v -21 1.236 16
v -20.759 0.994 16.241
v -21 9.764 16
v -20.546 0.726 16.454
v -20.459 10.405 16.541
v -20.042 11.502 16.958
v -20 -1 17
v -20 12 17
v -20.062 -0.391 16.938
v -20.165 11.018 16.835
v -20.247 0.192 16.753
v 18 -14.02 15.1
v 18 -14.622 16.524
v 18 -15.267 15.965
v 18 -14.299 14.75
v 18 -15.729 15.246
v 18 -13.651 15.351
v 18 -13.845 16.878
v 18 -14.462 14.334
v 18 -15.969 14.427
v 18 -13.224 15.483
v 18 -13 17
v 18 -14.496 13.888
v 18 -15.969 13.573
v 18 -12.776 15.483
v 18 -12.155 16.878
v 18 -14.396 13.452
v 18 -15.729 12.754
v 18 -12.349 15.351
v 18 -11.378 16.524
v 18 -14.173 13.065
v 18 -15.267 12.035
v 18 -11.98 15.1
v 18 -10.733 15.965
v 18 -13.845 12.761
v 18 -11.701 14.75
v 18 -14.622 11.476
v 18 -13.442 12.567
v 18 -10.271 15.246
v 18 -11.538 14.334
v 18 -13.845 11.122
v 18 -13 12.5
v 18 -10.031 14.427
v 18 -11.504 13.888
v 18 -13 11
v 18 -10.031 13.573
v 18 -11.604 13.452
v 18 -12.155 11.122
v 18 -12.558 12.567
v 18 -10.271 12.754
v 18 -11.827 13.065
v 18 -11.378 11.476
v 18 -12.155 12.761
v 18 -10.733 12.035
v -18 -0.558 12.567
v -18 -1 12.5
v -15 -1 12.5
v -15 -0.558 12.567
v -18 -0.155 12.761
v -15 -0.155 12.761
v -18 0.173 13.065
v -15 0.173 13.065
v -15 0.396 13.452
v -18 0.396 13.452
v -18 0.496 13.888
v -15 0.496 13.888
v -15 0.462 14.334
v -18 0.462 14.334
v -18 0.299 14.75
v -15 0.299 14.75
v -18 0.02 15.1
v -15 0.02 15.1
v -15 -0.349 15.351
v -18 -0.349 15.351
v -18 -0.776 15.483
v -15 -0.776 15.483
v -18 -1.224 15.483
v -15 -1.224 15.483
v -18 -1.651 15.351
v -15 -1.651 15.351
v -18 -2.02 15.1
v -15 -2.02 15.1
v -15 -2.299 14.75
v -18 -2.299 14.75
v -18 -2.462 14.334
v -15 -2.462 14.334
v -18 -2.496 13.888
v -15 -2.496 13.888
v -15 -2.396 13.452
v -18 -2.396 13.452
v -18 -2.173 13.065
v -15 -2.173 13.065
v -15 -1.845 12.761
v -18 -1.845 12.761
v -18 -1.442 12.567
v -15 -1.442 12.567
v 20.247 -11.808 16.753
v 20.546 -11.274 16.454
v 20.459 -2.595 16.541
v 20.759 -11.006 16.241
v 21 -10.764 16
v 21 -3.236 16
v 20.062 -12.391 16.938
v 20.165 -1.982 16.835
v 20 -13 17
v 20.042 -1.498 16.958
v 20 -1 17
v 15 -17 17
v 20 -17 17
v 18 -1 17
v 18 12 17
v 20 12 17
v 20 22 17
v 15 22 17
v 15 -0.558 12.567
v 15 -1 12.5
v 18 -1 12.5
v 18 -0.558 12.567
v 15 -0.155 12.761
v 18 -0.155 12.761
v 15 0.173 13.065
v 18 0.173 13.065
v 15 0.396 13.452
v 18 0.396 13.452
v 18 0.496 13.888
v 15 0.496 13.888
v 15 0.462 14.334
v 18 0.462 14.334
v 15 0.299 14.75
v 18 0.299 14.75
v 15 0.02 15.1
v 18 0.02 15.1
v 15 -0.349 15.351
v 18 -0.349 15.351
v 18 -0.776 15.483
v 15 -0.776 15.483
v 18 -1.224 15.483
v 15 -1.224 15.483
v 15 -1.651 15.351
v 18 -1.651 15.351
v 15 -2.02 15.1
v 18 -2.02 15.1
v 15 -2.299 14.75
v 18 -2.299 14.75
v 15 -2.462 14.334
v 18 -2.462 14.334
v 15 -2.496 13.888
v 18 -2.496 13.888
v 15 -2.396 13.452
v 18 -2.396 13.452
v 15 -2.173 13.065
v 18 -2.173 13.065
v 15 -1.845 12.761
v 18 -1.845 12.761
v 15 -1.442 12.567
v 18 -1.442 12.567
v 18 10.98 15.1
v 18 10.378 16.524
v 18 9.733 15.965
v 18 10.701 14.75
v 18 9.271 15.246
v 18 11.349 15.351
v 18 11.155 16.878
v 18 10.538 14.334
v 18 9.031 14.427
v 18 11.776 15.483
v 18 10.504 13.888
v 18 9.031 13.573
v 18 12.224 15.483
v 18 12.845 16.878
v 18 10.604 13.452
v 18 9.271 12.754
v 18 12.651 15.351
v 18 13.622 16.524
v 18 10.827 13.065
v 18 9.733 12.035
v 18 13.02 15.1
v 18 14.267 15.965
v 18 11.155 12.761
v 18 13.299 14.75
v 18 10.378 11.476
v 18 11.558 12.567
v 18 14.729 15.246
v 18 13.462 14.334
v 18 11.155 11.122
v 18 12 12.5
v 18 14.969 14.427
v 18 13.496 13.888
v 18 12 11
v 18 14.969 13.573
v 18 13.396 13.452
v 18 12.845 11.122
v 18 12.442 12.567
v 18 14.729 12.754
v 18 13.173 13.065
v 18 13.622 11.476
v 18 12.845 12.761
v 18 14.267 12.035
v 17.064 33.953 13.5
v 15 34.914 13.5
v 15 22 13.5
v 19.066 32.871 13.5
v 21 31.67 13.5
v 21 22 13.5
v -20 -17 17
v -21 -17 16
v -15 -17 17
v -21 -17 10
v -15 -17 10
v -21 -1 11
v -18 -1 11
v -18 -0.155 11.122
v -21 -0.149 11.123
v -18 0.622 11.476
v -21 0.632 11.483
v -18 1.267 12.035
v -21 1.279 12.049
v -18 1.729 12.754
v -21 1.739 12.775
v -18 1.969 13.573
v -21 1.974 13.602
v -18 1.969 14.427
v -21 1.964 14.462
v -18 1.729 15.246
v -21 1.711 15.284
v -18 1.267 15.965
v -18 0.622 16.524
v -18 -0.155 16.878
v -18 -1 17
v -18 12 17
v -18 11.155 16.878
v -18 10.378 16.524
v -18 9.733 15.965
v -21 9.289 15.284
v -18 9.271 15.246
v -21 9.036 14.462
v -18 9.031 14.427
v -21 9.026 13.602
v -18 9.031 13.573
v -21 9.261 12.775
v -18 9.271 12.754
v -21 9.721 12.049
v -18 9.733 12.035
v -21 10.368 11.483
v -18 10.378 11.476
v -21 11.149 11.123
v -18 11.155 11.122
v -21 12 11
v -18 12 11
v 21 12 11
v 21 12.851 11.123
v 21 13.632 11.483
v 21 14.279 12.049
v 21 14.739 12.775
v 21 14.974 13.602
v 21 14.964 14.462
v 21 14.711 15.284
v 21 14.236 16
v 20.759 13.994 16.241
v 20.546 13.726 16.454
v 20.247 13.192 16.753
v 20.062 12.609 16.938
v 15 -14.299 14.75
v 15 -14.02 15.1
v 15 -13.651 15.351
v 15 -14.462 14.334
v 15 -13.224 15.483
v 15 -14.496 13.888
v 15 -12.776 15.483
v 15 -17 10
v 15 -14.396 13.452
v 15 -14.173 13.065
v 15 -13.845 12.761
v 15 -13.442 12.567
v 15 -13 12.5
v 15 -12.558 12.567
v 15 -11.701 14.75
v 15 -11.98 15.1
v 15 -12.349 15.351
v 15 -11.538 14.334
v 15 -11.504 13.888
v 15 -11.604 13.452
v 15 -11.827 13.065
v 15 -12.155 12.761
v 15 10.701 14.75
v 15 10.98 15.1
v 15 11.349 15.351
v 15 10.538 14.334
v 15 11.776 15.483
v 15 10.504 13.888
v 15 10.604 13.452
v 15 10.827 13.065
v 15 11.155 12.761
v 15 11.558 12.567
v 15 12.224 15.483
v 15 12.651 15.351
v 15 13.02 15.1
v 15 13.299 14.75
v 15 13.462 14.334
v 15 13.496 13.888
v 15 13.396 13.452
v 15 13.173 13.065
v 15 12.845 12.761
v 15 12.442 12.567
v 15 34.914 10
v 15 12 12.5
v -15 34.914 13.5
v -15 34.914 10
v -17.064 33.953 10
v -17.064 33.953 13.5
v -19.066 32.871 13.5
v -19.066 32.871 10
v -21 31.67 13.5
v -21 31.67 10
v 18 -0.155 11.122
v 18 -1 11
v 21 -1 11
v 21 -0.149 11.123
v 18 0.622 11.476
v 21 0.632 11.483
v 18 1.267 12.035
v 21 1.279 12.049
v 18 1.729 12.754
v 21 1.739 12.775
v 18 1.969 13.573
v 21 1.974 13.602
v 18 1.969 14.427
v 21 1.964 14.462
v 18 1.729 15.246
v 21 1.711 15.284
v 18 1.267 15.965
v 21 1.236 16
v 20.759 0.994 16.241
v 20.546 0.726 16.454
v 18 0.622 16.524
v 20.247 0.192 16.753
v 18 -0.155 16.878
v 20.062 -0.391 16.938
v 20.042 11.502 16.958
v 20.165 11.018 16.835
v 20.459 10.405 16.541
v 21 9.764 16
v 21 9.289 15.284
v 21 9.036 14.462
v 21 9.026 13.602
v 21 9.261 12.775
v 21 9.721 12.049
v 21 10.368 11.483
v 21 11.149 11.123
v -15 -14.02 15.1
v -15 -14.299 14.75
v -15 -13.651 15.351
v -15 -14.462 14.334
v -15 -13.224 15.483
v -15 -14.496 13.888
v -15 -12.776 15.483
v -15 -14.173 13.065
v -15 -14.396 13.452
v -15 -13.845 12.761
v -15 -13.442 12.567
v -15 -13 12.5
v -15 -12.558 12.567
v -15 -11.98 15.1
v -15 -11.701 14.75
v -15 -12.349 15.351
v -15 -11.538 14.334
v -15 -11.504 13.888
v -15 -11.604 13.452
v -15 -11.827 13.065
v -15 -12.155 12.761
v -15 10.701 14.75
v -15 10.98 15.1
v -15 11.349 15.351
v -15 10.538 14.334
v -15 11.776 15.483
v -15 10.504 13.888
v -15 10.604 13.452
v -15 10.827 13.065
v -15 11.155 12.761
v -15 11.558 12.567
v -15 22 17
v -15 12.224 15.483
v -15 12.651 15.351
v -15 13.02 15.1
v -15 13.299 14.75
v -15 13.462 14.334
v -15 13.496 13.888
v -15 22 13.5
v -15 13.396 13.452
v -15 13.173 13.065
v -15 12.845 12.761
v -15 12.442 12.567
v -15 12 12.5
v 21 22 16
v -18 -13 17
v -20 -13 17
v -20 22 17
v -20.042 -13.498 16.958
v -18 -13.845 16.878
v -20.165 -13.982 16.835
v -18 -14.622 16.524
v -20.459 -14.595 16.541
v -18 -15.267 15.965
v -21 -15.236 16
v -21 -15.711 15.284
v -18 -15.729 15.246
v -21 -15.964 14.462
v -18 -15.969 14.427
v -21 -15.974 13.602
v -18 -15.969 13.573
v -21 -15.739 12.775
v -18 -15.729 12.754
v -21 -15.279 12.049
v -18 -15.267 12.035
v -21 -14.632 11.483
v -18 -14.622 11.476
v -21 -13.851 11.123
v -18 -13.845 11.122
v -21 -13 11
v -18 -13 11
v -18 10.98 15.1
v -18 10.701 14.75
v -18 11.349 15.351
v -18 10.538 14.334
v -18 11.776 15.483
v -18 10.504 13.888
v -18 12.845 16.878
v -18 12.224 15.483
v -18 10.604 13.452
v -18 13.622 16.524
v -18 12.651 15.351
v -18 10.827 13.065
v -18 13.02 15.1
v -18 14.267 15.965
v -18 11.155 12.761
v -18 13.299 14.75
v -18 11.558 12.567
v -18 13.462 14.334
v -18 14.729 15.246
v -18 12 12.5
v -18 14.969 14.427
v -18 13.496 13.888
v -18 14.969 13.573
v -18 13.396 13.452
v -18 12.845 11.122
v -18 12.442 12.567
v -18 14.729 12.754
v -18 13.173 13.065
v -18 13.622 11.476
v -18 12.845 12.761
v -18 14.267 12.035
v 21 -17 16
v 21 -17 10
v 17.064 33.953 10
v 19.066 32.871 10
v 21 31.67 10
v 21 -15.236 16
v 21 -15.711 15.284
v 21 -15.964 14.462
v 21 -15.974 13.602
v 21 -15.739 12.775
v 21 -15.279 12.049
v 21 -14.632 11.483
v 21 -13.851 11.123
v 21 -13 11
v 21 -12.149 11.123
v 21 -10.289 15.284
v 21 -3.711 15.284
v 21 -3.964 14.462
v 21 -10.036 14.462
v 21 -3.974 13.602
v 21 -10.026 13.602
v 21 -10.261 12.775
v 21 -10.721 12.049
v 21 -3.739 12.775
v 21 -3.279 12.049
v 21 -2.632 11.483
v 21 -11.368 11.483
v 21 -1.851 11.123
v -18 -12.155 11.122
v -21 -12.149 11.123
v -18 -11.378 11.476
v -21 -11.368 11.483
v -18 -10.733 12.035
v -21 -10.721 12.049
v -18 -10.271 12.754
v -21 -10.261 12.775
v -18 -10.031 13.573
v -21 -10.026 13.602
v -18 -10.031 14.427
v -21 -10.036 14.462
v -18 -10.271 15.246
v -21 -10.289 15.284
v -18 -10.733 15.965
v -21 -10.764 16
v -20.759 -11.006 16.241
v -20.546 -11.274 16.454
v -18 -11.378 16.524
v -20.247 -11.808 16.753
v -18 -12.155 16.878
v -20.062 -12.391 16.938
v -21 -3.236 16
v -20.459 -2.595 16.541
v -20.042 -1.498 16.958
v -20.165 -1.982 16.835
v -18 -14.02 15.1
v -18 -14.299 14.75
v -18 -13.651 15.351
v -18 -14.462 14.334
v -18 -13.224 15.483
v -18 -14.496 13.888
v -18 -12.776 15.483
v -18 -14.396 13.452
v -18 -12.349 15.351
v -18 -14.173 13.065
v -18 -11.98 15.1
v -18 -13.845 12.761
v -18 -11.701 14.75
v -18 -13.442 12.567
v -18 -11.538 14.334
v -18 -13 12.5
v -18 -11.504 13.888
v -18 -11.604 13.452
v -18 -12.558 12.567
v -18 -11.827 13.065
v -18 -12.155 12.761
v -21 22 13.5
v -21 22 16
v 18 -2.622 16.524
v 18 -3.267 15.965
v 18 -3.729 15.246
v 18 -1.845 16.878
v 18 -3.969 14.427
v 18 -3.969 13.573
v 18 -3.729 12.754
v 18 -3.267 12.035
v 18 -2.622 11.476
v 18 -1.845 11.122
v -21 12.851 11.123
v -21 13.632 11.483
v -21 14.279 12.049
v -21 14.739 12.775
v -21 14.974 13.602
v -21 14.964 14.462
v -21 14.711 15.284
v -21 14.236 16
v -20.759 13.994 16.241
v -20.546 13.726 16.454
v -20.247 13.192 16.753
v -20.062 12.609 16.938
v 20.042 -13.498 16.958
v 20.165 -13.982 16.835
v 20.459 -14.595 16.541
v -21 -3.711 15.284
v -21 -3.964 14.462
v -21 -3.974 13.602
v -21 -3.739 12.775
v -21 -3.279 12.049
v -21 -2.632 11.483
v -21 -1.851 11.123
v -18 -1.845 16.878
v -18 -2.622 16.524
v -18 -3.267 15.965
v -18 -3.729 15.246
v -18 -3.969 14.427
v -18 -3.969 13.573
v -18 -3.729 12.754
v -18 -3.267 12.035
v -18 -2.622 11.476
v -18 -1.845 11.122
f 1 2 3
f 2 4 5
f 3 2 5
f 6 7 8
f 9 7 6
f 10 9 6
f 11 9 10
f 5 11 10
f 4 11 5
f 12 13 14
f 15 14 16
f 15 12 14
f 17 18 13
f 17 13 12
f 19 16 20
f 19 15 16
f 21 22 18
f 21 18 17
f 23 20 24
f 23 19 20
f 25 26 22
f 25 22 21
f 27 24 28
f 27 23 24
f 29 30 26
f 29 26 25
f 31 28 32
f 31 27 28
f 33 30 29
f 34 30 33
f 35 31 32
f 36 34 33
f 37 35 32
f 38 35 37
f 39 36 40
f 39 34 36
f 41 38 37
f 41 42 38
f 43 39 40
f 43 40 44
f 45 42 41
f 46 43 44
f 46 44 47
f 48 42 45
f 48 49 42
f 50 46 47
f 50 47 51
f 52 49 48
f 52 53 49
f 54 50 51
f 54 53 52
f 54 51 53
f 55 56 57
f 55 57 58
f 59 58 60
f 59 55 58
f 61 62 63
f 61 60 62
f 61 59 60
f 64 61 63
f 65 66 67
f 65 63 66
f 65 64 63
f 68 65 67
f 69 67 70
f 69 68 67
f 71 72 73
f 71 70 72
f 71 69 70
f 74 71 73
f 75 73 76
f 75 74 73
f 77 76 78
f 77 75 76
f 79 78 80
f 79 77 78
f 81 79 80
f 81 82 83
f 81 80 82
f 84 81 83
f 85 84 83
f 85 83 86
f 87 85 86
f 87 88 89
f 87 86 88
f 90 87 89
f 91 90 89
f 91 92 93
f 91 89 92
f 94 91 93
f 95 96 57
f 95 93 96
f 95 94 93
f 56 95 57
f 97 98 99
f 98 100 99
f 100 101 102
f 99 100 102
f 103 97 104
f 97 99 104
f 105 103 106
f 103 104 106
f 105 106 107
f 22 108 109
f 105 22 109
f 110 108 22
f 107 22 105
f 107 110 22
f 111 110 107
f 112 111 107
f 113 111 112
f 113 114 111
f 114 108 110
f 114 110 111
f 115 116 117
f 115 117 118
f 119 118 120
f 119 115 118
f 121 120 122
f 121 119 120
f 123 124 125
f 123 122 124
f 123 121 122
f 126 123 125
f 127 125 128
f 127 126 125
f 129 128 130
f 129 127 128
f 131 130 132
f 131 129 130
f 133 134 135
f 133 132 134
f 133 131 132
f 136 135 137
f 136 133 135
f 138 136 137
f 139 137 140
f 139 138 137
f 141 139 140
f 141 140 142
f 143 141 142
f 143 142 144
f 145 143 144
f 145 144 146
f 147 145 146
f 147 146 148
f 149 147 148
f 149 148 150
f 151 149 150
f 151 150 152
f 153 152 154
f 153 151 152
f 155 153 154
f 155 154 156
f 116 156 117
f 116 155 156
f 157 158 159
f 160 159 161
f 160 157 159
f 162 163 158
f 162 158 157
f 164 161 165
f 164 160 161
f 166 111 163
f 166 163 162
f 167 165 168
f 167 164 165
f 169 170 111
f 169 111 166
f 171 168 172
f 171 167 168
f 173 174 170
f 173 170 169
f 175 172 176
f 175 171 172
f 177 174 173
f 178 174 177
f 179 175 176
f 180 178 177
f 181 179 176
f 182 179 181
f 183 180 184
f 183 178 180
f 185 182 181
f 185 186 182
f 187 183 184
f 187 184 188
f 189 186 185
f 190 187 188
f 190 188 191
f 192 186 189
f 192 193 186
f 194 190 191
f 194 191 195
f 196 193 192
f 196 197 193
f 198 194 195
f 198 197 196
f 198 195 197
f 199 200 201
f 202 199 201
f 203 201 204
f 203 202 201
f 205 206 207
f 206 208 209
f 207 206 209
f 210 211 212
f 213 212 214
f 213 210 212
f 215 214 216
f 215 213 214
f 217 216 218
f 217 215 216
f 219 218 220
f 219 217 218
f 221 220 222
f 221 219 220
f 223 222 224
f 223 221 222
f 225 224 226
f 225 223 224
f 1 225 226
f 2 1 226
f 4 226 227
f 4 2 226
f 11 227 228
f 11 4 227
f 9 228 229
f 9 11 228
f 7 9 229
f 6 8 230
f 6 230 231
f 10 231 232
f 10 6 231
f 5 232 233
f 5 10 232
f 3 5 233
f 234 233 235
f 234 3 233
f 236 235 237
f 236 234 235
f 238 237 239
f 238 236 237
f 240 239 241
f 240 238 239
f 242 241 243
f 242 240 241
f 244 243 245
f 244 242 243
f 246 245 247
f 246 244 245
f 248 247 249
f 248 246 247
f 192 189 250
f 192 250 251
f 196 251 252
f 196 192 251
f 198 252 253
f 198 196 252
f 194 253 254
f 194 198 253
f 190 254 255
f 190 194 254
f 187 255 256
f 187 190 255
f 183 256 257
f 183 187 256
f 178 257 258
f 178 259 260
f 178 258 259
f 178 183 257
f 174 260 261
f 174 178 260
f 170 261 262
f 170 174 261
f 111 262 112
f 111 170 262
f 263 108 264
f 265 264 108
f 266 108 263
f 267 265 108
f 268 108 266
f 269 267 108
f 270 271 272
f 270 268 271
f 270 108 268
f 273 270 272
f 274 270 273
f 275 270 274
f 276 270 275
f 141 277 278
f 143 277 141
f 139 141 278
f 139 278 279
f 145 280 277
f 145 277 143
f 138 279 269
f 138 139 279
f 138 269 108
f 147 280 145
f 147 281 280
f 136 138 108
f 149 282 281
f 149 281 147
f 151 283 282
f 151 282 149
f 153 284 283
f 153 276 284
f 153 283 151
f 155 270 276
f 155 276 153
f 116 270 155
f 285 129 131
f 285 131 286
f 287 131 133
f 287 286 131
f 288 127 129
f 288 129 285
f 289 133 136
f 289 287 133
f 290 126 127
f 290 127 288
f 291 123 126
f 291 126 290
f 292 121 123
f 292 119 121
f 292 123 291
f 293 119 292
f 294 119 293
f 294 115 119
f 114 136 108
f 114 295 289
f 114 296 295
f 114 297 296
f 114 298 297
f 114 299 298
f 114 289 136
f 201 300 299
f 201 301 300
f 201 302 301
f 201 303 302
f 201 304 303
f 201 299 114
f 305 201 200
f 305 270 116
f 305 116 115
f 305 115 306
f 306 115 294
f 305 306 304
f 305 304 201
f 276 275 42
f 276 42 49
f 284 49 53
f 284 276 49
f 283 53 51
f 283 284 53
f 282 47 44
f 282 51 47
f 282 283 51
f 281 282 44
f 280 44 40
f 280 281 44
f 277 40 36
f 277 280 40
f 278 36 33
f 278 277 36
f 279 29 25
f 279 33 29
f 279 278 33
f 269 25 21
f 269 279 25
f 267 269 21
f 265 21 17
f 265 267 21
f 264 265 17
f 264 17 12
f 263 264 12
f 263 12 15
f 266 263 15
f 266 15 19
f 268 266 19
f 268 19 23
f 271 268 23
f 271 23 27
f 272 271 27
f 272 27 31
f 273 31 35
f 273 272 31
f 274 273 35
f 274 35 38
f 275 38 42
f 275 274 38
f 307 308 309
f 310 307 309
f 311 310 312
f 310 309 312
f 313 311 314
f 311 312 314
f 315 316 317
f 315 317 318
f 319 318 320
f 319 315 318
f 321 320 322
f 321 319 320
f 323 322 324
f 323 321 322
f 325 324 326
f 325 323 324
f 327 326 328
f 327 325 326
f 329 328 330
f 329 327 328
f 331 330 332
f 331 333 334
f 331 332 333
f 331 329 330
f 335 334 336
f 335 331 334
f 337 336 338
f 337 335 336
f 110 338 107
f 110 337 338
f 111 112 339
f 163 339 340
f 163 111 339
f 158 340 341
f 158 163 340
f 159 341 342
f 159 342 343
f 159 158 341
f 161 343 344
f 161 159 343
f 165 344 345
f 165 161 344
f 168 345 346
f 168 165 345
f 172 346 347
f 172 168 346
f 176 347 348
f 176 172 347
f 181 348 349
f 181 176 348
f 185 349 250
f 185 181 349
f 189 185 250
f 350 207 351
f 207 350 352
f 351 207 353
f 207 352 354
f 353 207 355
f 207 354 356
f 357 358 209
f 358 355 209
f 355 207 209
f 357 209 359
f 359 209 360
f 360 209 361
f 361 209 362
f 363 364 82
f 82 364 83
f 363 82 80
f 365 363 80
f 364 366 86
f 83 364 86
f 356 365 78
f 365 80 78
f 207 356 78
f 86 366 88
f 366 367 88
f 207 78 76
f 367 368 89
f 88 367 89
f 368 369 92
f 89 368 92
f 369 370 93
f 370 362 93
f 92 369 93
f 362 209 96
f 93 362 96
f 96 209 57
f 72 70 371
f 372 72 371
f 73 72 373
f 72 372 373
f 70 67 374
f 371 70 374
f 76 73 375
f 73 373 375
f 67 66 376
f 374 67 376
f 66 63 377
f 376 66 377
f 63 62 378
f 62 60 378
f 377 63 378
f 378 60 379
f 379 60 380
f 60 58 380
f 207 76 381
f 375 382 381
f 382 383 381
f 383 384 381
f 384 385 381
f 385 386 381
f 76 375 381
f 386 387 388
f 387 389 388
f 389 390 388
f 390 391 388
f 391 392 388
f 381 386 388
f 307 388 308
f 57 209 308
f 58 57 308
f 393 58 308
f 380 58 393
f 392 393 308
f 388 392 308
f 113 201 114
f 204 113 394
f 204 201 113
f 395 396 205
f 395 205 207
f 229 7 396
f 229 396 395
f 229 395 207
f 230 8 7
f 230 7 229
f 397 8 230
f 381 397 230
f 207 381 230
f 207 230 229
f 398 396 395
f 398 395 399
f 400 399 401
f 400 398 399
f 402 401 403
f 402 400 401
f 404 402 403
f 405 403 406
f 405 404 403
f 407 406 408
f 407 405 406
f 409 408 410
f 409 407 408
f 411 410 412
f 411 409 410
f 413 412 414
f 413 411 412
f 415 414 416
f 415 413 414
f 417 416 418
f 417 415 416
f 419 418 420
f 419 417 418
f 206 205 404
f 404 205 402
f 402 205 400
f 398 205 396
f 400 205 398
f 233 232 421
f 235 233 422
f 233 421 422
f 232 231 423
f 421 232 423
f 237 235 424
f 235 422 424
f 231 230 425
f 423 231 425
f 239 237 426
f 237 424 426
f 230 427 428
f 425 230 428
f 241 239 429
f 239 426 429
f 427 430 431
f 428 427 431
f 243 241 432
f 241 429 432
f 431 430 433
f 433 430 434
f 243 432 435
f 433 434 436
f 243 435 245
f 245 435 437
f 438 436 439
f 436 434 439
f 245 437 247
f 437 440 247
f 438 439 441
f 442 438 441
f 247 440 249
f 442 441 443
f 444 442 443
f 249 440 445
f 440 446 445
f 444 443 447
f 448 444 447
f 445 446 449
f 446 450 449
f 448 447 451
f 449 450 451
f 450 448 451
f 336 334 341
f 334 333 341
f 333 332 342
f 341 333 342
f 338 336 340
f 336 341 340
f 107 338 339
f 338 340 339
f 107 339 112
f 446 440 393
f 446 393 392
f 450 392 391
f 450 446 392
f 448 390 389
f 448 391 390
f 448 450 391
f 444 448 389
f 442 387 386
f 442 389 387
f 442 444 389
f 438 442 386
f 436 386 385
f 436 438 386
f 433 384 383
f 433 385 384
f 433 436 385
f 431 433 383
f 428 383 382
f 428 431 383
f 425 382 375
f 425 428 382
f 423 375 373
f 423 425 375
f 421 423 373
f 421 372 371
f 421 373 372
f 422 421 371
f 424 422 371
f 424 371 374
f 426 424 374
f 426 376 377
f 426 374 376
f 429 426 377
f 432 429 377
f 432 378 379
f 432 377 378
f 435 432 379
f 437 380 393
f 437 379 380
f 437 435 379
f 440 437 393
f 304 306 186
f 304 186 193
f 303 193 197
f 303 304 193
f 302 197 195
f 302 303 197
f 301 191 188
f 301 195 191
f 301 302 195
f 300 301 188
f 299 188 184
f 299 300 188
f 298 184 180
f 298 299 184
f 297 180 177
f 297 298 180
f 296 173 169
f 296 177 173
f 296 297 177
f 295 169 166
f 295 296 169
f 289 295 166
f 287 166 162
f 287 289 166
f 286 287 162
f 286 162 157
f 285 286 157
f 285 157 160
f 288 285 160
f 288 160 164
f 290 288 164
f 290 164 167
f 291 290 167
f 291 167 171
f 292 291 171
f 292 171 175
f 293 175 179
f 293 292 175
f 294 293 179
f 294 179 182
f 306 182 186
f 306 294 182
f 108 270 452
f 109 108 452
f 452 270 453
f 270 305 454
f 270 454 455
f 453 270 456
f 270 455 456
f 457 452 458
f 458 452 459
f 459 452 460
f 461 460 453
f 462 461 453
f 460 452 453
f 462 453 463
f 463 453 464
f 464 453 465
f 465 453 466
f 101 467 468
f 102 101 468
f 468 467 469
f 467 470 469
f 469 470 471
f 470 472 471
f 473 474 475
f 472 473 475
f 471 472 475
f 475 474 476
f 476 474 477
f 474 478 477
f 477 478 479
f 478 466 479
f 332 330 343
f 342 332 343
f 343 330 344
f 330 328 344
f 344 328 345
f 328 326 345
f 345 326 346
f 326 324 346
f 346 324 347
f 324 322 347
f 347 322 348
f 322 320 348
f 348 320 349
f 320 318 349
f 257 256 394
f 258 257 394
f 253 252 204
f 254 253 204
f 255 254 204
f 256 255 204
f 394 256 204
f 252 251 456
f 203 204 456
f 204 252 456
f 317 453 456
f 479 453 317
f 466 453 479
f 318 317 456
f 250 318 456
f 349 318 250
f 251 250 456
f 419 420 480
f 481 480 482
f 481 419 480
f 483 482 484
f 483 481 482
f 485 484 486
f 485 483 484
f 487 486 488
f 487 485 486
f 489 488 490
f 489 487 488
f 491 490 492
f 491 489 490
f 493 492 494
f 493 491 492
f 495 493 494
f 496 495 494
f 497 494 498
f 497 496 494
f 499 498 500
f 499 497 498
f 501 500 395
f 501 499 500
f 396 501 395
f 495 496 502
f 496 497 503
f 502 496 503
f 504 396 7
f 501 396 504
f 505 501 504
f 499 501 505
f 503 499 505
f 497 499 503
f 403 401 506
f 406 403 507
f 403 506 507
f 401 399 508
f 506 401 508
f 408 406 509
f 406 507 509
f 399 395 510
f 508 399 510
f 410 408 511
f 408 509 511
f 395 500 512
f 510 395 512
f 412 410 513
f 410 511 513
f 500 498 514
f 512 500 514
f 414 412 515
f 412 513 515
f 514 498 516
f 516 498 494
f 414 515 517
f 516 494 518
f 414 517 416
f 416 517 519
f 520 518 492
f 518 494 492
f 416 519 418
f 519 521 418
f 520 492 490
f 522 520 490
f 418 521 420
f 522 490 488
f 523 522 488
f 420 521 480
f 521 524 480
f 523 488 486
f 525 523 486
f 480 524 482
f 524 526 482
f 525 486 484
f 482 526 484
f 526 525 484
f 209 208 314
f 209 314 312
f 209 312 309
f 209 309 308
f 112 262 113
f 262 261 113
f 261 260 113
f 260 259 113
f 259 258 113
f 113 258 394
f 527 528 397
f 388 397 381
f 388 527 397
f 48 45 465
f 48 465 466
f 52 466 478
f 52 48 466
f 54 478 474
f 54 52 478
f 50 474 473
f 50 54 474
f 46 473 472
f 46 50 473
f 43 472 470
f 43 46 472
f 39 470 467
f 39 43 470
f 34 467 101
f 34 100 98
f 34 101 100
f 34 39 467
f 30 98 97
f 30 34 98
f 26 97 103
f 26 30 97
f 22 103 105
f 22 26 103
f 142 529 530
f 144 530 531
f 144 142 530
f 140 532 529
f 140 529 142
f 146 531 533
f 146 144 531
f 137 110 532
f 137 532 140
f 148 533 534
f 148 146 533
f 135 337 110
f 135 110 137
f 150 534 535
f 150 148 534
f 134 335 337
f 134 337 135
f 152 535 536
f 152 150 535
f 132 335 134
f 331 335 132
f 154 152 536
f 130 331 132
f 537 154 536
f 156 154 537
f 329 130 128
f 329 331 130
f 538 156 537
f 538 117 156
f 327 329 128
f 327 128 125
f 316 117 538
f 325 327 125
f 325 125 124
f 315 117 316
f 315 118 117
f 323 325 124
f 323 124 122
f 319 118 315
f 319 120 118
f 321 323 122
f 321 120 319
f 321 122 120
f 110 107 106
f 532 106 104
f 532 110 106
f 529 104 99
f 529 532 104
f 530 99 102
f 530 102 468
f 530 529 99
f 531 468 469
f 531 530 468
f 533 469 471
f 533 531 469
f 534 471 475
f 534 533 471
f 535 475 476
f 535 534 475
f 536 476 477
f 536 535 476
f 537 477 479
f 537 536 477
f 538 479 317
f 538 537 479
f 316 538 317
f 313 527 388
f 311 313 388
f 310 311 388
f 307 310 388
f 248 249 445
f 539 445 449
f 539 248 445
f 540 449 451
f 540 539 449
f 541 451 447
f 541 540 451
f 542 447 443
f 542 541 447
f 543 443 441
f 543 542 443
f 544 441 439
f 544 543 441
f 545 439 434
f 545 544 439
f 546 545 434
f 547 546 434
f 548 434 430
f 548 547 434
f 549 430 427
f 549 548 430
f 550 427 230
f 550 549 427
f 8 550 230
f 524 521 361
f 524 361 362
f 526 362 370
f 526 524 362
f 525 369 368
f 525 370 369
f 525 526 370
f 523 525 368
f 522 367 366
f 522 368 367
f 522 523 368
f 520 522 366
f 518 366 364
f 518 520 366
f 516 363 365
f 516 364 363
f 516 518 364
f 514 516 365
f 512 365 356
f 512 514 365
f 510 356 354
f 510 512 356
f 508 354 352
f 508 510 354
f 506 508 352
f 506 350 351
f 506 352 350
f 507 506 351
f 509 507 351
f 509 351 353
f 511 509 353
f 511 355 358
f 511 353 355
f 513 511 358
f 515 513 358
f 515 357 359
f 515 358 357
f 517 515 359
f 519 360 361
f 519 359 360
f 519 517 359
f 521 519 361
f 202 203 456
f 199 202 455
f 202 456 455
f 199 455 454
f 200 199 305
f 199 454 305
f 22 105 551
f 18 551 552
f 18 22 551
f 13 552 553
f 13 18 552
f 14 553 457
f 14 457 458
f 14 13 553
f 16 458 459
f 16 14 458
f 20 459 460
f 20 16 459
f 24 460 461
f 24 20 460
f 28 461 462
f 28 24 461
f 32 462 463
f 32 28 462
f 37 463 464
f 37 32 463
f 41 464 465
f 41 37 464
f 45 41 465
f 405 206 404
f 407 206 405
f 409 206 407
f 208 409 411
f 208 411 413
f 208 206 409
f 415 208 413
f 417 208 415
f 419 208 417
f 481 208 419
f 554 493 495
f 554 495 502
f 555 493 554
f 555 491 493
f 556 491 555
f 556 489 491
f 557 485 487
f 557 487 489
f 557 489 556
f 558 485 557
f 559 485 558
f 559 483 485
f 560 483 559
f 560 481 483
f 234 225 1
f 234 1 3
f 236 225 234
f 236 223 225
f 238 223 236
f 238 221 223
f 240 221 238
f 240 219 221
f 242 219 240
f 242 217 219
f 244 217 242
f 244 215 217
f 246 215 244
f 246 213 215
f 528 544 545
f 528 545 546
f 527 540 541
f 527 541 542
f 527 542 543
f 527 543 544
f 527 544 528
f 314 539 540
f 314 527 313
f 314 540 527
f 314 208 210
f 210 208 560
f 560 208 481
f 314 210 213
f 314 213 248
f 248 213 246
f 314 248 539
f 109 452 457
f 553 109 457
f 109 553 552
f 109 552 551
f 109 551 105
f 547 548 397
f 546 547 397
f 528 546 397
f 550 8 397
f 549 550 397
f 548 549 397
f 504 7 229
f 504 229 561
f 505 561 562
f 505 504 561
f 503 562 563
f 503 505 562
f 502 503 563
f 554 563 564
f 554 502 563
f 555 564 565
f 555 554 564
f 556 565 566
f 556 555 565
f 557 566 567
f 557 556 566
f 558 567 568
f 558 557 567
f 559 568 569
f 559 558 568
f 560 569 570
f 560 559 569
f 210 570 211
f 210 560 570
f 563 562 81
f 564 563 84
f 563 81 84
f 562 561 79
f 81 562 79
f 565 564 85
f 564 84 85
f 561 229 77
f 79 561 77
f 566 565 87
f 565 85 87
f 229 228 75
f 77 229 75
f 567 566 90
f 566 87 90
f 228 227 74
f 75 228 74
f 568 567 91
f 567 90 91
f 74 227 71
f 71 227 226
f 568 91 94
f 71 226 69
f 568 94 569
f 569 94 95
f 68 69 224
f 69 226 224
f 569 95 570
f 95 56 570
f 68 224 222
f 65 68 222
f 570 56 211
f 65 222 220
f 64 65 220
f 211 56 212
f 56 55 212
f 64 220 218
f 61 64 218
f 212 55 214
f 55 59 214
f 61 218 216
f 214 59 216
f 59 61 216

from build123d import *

# Parameters (mm, degrees)
BOX990_W           = 48
BOX990_H           = 20
BOX990_DEPTH       = 18
CYLINDER2690_R     = 1.5
CYLINDER2690_DEPTH = 64
CYLINDER2696_R     = 1.5
CYLINDER2696_DEPTH = 64
CYLINDER2695_R     = 1.5
CYLINDER2695_DEPTH = 64
CYLINDER2691_R     = 3
CYLINDER2691_DEPTH = 3
CYLINDER2692_R     = 3
CYLINDER2692_DEPTH = 3
CYLINDER2694_R     = 3
CYLINDER2694_DEPTH = 3
CYLINDER2693_R     = 3
CYLINDER2693_DEPTH = 3
CYLINDER2697_R     = 3
CYLINDER2697_DEPTH = 3
CYLINDER2698_R     = 3
CYLINDER2698_DEPTH = 3
CYLINDER2648_R     = 38
CYLINDER2648_DEPTH = 20
BOX888_W           = 6
BOX888_H           = 54
BOX888_DEPTH       = 7
BOX887_W           = 6
BOX887_H           = 54
BOX887_DEPTH       = 7
CHAMFER144_SIZE    = 1


with BuildPart() as krychle989:
    # Box990 → Box990 (new body)
    with BuildSketch(Plane(origin=(-24, 22, 13.5), x_dir=(1, 0, 0), z_dir=(0, 0, 1))):
        with Locations((24, 10)):
            Rectangle(BOX990_W, BOX990_H)
    extrude(amount=BOX990_DEPTH)


with BuildPart() as v_lec2660:
    # Cylinder2690 → Cylinder2690 (new body)
    with BuildSketch(Plane(origin=(-26, -11, 13), x_dir=(0, 0, -1), z_dir=(1, 0, 0))):
        Circle(CYLINDER2690_R)
    extrude(amount=CYLINDER2690_DEPTH)


with BuildPart() as v_lec2666:
    # Cylinder2696 → Cylinder2696 (new body)
    with BuildSketch(Plane(origin=(-26, 14, 13), x_dir=(0, 0, -1), z_dir=(1, 0, 0))):
        Circle(CYLINDER2696_R)
    extrude(amount=CYLINDER2696_DEPTH)


with BuildPart() as compound1202:
    # Cylinder2695 → Cylinder2695 (new body)
    with BuildSketch(Plane(origin=(-26, 1, 13), x_dir=(0, 0, -1), z_dir=(1, 0, 0))):
        Circle(CYLINDER2695_R)
    extrude(amount=CYLINDER2695_DEPTH)

    # Compound1202: union Válec2660, Válec2666
    add(v_lec2660.part)
    add(v_lec2666.part)


with BuildPart() as compound1202_1:
    # Compound1202 placement: moved
    add(compound1202.part.moved(Location((0, -2, 1))))


with BuildPart() as v_lec2661:
    # Cylinder2691 → Cylinder2691 (new body)
    with BuildSketch(Plane(origin=(-26, -11, 13), x_dir=(0, 0, -1), z_dir=(1, 0, 0))):
        Circle(CYLINDER2691_R)
    extrude(amount=CYLINDER2691_DEPTH)


with BuildPart() as v_lec2662:
    # Cylinder2692 → Cylinder2692 (new body)
    with BuildSketch(Plane(origin=(-26, 14, 13), x_dir=(0, 0, -1), z_dir=(1, 0, 0))):
        Circle(CYLINDER2692_R)
    extrude(amount=CYLINDER2692_DEPTH)


with BuildPart() as compound1201:
    # Cylinder2694 → Cylinder2694 (new body)
    with BuildSketch(Plane(origin=(-26, 1, 13), x_dir=(0, 0, -1), z_dir=(1, 0, 0))):
        Circle(CYLINDER2694_R)
    extrude(amount=CYLINDER2694_DEPTH)

    # Compound1201: union Válec2661, Válec2662
    add(v_lec2661.part)
    add(v_lec2662.part)


with BuildPart() as compound1201_1:
    # Compound1201 placement: moved
    add(compound1201.part.moved(Location((5, -2, 1))))


with BuildPart() as v_lec2663:
    # Cylinder2693 → Cylinder2693 (new body)
    with BuildSketch(Plane(origin=(-26, -11, 13), x_dir=(0, 0, -1), z_dir=(1, 0, 0))):
        Circle(CYLINDER2693_R)
    extrude(amount=CYLINDER2693_DEPTH)


with BuildPart() as v_lec2667:
    # Cylinder2697 → Cylinder2697 (new body)
    with BuildSketch(Plane(origin=(-26, 14, 13), x_dir=(0, 0, -1), z_dir=(1, 0, 0))):
        Circle(CYLINDER2697_R)
    extrude(amount=CYLINDER2697_DEPTH)


with BuildPart() as compound1183:
    # Cylinder2698 → Cylinder2698 (new body)
    with BuildSketch(Plane(origin=(-26, 1, 13), x_dir=(0, 0, -1), z_dir=(1, 0, 0))):
        Circle(CYLINDER2698_R)
    extrude(amount=CYLINDER2698_DEPTH)

    # Compound1183: union Válec2663, Válec2667
    add(v_lec2663.part)
    add(v_lec2667.part)


with BuildPart() as compound1183_1:
    # Compound1183 placement: moved
    add(compound1183.part.moved(Location((44, -2, 1))))


with BuildPart() as v_lec2618:
    # Cylinder2648 → Cylinder2648 (new body)
    with BuildSketch(Plane.XY):
        Circle(CYLINDER2648_R)
    extrude(amount=CYLINDER2648_DEPTH)


with BuildPart() as krychle887:
    # Box888 → Box888 (new body)
    with BuildSketch(Plane(origin=(-21, -17, 10), x_dir=(1, 0, 0), z_dir=(0, 0, 1))):
        with Locations((3, 27)):
            Rectangle(BOX888_W, BOX888_H)
    extrude(amount=BOX888_DEPTH)


with BuildPart() as cut1061:
    # Box887 → Box887 (new body)
    with BuildSketch(Plane(origin=(15, -17, 10), x_dir=(1, 0, 0), z_dir=(0, 0, 1))):
        with Locations((3, 27)):
            Rectangle(BOX887_W, BOX887_H)
    extrude(amount=BOX887_DEPTH)

    # Compound1171: union Krychle887
    add(krychle887.part)

    # Common006: intersect Válec2618
    add(v_lec2618.part, mode=Mode.INTERSECT)

    # Chamfer144
    chamfer144_edges = [cut1061.edges().sort_by_distance(p)[0] for p in [
        (21, 7.335088, 17),
        (-21, 7.335088, 17),
    ]]
    chamfer(chamfer144_edges, length=CHAMFER144_SIZE)

    # Cut988: cut Compound1183
    add(compound1183_1.part, mode=Mode.SUBTRACT)

    # Cut1011: cut Compound1201
    add(compound1201_1.part, mode=Mode.SUBTRACT)

    # Cut1010: cut Compound1202
    add(compound1202_1.part, mode=Mode.SUBTRACT)

    # Cut1061: cut Krychle989
    add(krychle989.part, mode=Mode.SUBTRACT)


solid = cut1061.part
